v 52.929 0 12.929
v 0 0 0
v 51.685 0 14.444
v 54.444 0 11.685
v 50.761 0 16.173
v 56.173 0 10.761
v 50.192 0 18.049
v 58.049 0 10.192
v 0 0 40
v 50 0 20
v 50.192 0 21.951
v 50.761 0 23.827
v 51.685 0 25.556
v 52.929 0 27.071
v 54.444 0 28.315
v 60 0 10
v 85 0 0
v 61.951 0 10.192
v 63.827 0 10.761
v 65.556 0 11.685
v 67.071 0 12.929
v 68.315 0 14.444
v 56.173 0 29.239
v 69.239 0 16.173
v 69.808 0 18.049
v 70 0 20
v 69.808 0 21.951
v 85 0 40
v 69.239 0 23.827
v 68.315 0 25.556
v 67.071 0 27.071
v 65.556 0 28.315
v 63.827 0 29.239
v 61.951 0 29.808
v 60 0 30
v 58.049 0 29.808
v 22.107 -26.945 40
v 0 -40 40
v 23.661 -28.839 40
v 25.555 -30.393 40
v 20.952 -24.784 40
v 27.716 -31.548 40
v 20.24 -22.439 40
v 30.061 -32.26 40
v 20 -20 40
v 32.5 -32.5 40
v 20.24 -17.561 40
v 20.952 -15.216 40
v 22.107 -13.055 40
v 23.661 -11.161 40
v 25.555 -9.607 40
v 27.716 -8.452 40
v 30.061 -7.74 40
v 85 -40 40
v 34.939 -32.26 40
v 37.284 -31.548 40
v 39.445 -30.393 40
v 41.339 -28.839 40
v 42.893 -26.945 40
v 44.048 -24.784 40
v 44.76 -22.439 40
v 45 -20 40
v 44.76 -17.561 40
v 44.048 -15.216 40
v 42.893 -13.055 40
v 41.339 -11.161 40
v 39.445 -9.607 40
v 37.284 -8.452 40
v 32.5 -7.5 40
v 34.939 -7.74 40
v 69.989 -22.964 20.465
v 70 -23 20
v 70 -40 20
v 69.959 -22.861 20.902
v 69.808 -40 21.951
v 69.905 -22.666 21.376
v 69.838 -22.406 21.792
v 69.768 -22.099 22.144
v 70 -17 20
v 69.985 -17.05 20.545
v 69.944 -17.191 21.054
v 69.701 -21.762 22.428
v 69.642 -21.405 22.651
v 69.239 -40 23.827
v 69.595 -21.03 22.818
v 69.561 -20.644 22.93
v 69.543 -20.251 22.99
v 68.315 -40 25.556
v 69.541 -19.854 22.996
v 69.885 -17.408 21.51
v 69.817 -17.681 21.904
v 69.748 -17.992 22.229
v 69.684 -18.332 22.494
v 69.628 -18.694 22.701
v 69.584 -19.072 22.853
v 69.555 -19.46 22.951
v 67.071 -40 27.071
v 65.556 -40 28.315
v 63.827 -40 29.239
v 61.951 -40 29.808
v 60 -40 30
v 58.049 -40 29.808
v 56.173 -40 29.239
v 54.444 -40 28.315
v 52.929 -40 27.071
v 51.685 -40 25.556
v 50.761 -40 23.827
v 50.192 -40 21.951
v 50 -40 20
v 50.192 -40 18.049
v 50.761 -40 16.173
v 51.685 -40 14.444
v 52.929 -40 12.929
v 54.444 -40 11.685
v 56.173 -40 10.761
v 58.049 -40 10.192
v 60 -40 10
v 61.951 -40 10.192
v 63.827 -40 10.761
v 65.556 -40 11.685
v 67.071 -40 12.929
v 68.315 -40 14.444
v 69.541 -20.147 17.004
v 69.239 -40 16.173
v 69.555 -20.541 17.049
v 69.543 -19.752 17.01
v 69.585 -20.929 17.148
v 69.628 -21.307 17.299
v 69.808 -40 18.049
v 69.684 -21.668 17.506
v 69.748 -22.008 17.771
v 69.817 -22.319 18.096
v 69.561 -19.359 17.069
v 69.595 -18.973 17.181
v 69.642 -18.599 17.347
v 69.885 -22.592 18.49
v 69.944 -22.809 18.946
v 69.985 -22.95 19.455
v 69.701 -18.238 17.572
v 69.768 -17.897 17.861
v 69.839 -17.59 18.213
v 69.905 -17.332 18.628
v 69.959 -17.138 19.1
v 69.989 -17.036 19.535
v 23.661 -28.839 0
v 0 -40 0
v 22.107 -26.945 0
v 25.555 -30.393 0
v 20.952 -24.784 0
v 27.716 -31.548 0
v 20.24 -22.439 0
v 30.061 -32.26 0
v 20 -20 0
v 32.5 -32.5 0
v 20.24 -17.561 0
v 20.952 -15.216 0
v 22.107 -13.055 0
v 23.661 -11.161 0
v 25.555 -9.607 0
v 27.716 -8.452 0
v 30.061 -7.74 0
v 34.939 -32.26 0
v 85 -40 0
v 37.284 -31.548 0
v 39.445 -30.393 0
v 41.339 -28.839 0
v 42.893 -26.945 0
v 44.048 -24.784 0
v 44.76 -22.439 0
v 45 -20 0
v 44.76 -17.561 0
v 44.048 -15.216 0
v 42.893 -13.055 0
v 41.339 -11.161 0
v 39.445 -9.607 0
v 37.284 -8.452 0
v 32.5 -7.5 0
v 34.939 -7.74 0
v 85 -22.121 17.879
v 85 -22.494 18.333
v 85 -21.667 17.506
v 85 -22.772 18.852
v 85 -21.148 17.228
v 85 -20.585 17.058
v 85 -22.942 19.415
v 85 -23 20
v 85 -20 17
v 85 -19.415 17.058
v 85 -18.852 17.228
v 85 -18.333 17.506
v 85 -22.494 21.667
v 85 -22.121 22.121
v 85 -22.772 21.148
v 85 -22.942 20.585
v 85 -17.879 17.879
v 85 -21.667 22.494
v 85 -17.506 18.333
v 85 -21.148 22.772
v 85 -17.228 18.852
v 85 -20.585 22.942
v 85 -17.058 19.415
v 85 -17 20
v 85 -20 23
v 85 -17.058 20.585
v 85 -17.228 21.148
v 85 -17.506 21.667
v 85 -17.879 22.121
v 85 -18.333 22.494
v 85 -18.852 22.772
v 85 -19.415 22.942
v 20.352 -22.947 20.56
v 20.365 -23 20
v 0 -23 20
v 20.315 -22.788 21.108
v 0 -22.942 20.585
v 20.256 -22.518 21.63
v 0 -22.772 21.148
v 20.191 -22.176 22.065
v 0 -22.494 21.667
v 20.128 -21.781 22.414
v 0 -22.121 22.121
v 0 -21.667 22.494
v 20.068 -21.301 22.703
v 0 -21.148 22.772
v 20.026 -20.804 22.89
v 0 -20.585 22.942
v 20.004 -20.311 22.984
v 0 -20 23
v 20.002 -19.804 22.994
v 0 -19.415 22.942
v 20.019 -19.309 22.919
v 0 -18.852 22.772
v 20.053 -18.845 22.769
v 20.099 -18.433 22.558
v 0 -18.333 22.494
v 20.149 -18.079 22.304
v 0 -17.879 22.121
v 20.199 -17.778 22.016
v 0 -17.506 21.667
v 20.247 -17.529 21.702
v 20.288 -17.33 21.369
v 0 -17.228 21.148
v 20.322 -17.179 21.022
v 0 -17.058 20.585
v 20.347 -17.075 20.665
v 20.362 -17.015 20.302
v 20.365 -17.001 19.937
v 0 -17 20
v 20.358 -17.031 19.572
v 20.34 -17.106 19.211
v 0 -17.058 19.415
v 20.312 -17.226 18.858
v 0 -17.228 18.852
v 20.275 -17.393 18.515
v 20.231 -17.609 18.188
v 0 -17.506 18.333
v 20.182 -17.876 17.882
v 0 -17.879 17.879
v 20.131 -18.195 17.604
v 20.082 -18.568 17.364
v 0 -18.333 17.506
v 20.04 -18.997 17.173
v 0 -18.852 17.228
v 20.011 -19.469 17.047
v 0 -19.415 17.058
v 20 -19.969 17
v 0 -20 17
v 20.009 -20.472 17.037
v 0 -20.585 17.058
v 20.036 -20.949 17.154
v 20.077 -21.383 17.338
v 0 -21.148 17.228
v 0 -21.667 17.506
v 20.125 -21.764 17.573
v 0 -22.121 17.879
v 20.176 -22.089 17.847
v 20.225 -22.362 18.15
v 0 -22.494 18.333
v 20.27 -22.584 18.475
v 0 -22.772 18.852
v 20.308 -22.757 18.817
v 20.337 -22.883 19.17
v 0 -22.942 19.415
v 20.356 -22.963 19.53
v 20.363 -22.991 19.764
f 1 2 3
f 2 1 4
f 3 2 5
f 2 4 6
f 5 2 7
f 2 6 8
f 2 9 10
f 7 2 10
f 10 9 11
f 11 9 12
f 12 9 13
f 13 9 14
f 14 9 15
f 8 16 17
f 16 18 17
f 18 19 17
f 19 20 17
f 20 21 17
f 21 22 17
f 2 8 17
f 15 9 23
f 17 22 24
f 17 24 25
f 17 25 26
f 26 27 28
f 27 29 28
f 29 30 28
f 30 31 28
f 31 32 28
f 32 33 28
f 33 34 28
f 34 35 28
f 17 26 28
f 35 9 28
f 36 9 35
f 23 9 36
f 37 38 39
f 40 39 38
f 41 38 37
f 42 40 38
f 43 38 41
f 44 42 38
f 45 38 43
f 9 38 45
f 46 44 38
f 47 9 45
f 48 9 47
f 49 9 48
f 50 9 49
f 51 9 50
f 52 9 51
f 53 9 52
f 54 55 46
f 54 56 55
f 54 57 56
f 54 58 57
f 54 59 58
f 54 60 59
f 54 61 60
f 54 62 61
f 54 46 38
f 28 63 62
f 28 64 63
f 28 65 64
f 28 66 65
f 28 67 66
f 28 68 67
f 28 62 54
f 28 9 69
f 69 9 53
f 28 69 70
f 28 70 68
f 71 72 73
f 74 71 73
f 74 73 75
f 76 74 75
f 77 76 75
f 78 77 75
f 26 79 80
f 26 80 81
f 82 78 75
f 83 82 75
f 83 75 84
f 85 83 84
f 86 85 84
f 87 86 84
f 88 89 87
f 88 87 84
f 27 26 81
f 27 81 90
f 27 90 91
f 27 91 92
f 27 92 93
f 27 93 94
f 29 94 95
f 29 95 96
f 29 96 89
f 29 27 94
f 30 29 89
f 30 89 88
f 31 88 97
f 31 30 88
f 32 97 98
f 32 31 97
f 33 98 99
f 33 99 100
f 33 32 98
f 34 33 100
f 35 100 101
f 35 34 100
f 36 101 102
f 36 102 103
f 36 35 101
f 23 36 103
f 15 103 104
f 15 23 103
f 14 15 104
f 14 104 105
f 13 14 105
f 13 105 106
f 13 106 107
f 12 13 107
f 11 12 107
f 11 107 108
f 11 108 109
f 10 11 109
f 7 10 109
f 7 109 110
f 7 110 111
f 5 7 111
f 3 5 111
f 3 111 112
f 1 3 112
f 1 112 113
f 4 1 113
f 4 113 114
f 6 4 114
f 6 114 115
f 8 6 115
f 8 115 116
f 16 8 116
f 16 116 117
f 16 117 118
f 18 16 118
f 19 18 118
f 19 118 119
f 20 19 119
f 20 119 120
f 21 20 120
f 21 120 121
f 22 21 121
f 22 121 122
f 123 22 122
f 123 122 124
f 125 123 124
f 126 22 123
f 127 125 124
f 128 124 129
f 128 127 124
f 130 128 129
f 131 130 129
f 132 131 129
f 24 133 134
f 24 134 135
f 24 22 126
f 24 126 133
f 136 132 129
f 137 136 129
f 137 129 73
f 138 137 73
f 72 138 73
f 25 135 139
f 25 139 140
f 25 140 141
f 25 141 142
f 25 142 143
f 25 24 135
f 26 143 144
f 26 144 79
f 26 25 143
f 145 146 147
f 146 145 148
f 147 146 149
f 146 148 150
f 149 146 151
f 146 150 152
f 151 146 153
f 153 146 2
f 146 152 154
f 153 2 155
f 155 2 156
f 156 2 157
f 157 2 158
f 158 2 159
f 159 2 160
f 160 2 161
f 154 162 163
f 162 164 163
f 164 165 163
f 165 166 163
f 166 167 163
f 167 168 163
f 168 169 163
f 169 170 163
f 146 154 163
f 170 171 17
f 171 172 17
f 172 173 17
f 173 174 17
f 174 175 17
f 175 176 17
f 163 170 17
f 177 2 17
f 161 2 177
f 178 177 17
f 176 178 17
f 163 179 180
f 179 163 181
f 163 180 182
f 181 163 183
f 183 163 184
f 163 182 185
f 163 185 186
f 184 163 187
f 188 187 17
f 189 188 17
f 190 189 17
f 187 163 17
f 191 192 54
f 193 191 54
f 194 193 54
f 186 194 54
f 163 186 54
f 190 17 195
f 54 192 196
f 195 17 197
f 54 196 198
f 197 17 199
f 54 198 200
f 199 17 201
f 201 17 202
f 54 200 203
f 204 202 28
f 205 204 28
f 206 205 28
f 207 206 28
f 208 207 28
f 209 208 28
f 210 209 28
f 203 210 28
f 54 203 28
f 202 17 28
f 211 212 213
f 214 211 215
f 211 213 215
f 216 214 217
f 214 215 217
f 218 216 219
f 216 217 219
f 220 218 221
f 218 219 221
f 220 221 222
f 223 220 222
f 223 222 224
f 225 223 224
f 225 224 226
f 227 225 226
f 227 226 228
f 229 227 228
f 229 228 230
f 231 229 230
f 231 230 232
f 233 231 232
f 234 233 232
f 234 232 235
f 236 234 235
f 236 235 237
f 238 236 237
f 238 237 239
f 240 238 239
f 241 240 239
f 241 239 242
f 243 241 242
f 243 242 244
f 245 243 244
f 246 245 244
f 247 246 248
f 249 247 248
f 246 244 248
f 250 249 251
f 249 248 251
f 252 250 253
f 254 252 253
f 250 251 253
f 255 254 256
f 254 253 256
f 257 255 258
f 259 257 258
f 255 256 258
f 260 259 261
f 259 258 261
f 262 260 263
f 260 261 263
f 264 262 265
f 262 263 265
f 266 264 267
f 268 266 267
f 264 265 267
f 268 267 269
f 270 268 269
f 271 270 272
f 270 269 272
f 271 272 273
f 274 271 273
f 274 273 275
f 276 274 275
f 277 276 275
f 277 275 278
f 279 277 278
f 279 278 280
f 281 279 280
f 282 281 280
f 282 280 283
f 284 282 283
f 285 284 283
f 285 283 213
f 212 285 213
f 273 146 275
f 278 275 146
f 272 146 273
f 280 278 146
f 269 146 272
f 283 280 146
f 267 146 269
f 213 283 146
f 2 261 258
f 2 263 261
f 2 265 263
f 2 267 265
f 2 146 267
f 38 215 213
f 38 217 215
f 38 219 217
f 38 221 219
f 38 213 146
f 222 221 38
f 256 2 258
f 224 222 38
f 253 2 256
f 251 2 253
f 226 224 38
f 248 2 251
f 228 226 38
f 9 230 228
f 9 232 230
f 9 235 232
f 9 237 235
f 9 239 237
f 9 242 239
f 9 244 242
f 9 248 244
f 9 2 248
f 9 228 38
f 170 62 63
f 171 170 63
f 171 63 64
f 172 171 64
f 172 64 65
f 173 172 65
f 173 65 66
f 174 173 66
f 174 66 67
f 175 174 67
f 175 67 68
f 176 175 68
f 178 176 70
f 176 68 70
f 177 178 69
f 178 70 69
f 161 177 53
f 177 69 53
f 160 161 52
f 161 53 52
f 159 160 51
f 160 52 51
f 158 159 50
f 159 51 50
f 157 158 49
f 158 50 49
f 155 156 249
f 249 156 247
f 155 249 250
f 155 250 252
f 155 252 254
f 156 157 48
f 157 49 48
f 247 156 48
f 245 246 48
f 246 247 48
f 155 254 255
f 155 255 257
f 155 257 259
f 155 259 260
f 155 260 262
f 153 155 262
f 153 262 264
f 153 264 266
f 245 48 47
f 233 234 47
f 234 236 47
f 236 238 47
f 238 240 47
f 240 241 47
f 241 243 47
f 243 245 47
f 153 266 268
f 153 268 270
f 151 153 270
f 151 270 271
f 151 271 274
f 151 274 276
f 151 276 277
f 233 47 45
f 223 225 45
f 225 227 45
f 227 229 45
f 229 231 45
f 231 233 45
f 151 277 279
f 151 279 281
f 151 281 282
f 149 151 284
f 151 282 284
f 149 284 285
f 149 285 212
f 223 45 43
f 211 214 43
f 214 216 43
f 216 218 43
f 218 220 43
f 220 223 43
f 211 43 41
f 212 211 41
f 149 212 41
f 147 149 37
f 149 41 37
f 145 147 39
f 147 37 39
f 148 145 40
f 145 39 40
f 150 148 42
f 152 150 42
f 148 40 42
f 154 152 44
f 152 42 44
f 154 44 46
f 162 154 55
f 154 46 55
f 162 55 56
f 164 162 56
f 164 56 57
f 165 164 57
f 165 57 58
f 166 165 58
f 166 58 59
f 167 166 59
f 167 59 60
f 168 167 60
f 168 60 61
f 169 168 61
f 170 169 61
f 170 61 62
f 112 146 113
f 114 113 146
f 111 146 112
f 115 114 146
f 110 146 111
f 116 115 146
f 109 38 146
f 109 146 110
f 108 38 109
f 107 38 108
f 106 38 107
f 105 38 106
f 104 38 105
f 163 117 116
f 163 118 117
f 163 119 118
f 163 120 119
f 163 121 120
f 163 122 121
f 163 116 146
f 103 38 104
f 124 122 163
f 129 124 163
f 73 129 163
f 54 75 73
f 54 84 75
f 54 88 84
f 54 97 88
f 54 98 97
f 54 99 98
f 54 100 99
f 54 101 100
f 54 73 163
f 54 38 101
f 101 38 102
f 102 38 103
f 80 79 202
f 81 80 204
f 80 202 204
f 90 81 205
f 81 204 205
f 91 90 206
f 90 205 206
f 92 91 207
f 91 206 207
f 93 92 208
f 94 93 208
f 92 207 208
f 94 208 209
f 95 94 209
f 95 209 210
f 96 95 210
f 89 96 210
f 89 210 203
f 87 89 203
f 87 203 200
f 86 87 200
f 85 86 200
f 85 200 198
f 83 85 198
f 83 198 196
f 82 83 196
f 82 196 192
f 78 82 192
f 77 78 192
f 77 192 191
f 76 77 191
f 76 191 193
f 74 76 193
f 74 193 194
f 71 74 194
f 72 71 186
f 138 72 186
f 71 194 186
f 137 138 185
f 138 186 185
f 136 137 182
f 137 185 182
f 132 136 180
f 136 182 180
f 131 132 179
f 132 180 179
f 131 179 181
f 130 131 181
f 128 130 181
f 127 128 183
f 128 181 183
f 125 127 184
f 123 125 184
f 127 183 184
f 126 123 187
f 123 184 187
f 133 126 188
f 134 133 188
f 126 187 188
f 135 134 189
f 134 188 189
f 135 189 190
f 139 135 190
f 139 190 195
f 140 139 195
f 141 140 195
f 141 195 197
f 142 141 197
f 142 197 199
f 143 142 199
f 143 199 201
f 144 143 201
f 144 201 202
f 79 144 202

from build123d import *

# Parameters (mm, degrees)
F0_W     = 85
F0_H     = 40
F0_R     = 10
F1_DEPTH = 40
F2_R     = 12.5
F3_DEPTH = 40.001
F4_R     = 3
F5_DEPTH = 25
F6_R     = 3
F7_DEPTH = 25


with BuildPart() as f1:
    # F0 (on Front) → F1 (new body)
    with BuildSketch(Plane.XZ):
        with Locations((42.5, 20)):
            Rectangle(F0_W, F0_H)
        with Locations((60, 20)):
            Circle(F0_R, mode=Mode.SUBTRACT)
    extrude(amount=F1_DEPTH)

    # F2 (on face) → F3 (cut, through all)
    with BuildSketch(Plane.XY.offset(40)):
        with Locations((32.5, -20)):
            Circle(F2_R)
    extrude(amount=-F3_DEPTH, mode=Mode.SUBTRACT)

    # F4 (on face) → F5 (cut)
    with BuildSketch(Plane.YZ.offset(85)):
        with Locations((-20, 20)):
            Circle(F4_R)
    extrude(amount=-F5_DEPTH, mode=Mode.SUBTRACT)

    # F6 (on face) → F7 (cut)
    with BuildSketch(Plane(origin=(0, 0, 0), x_dir=(0, -1, 0), z_dir=(-1, 0, 0))):
        with Locations((20, 20)):
            Circle(F6_R)
    extrude(amount=-F7_DEPTH, mode=Mode.SUBTRACT)


solid = f1.part
